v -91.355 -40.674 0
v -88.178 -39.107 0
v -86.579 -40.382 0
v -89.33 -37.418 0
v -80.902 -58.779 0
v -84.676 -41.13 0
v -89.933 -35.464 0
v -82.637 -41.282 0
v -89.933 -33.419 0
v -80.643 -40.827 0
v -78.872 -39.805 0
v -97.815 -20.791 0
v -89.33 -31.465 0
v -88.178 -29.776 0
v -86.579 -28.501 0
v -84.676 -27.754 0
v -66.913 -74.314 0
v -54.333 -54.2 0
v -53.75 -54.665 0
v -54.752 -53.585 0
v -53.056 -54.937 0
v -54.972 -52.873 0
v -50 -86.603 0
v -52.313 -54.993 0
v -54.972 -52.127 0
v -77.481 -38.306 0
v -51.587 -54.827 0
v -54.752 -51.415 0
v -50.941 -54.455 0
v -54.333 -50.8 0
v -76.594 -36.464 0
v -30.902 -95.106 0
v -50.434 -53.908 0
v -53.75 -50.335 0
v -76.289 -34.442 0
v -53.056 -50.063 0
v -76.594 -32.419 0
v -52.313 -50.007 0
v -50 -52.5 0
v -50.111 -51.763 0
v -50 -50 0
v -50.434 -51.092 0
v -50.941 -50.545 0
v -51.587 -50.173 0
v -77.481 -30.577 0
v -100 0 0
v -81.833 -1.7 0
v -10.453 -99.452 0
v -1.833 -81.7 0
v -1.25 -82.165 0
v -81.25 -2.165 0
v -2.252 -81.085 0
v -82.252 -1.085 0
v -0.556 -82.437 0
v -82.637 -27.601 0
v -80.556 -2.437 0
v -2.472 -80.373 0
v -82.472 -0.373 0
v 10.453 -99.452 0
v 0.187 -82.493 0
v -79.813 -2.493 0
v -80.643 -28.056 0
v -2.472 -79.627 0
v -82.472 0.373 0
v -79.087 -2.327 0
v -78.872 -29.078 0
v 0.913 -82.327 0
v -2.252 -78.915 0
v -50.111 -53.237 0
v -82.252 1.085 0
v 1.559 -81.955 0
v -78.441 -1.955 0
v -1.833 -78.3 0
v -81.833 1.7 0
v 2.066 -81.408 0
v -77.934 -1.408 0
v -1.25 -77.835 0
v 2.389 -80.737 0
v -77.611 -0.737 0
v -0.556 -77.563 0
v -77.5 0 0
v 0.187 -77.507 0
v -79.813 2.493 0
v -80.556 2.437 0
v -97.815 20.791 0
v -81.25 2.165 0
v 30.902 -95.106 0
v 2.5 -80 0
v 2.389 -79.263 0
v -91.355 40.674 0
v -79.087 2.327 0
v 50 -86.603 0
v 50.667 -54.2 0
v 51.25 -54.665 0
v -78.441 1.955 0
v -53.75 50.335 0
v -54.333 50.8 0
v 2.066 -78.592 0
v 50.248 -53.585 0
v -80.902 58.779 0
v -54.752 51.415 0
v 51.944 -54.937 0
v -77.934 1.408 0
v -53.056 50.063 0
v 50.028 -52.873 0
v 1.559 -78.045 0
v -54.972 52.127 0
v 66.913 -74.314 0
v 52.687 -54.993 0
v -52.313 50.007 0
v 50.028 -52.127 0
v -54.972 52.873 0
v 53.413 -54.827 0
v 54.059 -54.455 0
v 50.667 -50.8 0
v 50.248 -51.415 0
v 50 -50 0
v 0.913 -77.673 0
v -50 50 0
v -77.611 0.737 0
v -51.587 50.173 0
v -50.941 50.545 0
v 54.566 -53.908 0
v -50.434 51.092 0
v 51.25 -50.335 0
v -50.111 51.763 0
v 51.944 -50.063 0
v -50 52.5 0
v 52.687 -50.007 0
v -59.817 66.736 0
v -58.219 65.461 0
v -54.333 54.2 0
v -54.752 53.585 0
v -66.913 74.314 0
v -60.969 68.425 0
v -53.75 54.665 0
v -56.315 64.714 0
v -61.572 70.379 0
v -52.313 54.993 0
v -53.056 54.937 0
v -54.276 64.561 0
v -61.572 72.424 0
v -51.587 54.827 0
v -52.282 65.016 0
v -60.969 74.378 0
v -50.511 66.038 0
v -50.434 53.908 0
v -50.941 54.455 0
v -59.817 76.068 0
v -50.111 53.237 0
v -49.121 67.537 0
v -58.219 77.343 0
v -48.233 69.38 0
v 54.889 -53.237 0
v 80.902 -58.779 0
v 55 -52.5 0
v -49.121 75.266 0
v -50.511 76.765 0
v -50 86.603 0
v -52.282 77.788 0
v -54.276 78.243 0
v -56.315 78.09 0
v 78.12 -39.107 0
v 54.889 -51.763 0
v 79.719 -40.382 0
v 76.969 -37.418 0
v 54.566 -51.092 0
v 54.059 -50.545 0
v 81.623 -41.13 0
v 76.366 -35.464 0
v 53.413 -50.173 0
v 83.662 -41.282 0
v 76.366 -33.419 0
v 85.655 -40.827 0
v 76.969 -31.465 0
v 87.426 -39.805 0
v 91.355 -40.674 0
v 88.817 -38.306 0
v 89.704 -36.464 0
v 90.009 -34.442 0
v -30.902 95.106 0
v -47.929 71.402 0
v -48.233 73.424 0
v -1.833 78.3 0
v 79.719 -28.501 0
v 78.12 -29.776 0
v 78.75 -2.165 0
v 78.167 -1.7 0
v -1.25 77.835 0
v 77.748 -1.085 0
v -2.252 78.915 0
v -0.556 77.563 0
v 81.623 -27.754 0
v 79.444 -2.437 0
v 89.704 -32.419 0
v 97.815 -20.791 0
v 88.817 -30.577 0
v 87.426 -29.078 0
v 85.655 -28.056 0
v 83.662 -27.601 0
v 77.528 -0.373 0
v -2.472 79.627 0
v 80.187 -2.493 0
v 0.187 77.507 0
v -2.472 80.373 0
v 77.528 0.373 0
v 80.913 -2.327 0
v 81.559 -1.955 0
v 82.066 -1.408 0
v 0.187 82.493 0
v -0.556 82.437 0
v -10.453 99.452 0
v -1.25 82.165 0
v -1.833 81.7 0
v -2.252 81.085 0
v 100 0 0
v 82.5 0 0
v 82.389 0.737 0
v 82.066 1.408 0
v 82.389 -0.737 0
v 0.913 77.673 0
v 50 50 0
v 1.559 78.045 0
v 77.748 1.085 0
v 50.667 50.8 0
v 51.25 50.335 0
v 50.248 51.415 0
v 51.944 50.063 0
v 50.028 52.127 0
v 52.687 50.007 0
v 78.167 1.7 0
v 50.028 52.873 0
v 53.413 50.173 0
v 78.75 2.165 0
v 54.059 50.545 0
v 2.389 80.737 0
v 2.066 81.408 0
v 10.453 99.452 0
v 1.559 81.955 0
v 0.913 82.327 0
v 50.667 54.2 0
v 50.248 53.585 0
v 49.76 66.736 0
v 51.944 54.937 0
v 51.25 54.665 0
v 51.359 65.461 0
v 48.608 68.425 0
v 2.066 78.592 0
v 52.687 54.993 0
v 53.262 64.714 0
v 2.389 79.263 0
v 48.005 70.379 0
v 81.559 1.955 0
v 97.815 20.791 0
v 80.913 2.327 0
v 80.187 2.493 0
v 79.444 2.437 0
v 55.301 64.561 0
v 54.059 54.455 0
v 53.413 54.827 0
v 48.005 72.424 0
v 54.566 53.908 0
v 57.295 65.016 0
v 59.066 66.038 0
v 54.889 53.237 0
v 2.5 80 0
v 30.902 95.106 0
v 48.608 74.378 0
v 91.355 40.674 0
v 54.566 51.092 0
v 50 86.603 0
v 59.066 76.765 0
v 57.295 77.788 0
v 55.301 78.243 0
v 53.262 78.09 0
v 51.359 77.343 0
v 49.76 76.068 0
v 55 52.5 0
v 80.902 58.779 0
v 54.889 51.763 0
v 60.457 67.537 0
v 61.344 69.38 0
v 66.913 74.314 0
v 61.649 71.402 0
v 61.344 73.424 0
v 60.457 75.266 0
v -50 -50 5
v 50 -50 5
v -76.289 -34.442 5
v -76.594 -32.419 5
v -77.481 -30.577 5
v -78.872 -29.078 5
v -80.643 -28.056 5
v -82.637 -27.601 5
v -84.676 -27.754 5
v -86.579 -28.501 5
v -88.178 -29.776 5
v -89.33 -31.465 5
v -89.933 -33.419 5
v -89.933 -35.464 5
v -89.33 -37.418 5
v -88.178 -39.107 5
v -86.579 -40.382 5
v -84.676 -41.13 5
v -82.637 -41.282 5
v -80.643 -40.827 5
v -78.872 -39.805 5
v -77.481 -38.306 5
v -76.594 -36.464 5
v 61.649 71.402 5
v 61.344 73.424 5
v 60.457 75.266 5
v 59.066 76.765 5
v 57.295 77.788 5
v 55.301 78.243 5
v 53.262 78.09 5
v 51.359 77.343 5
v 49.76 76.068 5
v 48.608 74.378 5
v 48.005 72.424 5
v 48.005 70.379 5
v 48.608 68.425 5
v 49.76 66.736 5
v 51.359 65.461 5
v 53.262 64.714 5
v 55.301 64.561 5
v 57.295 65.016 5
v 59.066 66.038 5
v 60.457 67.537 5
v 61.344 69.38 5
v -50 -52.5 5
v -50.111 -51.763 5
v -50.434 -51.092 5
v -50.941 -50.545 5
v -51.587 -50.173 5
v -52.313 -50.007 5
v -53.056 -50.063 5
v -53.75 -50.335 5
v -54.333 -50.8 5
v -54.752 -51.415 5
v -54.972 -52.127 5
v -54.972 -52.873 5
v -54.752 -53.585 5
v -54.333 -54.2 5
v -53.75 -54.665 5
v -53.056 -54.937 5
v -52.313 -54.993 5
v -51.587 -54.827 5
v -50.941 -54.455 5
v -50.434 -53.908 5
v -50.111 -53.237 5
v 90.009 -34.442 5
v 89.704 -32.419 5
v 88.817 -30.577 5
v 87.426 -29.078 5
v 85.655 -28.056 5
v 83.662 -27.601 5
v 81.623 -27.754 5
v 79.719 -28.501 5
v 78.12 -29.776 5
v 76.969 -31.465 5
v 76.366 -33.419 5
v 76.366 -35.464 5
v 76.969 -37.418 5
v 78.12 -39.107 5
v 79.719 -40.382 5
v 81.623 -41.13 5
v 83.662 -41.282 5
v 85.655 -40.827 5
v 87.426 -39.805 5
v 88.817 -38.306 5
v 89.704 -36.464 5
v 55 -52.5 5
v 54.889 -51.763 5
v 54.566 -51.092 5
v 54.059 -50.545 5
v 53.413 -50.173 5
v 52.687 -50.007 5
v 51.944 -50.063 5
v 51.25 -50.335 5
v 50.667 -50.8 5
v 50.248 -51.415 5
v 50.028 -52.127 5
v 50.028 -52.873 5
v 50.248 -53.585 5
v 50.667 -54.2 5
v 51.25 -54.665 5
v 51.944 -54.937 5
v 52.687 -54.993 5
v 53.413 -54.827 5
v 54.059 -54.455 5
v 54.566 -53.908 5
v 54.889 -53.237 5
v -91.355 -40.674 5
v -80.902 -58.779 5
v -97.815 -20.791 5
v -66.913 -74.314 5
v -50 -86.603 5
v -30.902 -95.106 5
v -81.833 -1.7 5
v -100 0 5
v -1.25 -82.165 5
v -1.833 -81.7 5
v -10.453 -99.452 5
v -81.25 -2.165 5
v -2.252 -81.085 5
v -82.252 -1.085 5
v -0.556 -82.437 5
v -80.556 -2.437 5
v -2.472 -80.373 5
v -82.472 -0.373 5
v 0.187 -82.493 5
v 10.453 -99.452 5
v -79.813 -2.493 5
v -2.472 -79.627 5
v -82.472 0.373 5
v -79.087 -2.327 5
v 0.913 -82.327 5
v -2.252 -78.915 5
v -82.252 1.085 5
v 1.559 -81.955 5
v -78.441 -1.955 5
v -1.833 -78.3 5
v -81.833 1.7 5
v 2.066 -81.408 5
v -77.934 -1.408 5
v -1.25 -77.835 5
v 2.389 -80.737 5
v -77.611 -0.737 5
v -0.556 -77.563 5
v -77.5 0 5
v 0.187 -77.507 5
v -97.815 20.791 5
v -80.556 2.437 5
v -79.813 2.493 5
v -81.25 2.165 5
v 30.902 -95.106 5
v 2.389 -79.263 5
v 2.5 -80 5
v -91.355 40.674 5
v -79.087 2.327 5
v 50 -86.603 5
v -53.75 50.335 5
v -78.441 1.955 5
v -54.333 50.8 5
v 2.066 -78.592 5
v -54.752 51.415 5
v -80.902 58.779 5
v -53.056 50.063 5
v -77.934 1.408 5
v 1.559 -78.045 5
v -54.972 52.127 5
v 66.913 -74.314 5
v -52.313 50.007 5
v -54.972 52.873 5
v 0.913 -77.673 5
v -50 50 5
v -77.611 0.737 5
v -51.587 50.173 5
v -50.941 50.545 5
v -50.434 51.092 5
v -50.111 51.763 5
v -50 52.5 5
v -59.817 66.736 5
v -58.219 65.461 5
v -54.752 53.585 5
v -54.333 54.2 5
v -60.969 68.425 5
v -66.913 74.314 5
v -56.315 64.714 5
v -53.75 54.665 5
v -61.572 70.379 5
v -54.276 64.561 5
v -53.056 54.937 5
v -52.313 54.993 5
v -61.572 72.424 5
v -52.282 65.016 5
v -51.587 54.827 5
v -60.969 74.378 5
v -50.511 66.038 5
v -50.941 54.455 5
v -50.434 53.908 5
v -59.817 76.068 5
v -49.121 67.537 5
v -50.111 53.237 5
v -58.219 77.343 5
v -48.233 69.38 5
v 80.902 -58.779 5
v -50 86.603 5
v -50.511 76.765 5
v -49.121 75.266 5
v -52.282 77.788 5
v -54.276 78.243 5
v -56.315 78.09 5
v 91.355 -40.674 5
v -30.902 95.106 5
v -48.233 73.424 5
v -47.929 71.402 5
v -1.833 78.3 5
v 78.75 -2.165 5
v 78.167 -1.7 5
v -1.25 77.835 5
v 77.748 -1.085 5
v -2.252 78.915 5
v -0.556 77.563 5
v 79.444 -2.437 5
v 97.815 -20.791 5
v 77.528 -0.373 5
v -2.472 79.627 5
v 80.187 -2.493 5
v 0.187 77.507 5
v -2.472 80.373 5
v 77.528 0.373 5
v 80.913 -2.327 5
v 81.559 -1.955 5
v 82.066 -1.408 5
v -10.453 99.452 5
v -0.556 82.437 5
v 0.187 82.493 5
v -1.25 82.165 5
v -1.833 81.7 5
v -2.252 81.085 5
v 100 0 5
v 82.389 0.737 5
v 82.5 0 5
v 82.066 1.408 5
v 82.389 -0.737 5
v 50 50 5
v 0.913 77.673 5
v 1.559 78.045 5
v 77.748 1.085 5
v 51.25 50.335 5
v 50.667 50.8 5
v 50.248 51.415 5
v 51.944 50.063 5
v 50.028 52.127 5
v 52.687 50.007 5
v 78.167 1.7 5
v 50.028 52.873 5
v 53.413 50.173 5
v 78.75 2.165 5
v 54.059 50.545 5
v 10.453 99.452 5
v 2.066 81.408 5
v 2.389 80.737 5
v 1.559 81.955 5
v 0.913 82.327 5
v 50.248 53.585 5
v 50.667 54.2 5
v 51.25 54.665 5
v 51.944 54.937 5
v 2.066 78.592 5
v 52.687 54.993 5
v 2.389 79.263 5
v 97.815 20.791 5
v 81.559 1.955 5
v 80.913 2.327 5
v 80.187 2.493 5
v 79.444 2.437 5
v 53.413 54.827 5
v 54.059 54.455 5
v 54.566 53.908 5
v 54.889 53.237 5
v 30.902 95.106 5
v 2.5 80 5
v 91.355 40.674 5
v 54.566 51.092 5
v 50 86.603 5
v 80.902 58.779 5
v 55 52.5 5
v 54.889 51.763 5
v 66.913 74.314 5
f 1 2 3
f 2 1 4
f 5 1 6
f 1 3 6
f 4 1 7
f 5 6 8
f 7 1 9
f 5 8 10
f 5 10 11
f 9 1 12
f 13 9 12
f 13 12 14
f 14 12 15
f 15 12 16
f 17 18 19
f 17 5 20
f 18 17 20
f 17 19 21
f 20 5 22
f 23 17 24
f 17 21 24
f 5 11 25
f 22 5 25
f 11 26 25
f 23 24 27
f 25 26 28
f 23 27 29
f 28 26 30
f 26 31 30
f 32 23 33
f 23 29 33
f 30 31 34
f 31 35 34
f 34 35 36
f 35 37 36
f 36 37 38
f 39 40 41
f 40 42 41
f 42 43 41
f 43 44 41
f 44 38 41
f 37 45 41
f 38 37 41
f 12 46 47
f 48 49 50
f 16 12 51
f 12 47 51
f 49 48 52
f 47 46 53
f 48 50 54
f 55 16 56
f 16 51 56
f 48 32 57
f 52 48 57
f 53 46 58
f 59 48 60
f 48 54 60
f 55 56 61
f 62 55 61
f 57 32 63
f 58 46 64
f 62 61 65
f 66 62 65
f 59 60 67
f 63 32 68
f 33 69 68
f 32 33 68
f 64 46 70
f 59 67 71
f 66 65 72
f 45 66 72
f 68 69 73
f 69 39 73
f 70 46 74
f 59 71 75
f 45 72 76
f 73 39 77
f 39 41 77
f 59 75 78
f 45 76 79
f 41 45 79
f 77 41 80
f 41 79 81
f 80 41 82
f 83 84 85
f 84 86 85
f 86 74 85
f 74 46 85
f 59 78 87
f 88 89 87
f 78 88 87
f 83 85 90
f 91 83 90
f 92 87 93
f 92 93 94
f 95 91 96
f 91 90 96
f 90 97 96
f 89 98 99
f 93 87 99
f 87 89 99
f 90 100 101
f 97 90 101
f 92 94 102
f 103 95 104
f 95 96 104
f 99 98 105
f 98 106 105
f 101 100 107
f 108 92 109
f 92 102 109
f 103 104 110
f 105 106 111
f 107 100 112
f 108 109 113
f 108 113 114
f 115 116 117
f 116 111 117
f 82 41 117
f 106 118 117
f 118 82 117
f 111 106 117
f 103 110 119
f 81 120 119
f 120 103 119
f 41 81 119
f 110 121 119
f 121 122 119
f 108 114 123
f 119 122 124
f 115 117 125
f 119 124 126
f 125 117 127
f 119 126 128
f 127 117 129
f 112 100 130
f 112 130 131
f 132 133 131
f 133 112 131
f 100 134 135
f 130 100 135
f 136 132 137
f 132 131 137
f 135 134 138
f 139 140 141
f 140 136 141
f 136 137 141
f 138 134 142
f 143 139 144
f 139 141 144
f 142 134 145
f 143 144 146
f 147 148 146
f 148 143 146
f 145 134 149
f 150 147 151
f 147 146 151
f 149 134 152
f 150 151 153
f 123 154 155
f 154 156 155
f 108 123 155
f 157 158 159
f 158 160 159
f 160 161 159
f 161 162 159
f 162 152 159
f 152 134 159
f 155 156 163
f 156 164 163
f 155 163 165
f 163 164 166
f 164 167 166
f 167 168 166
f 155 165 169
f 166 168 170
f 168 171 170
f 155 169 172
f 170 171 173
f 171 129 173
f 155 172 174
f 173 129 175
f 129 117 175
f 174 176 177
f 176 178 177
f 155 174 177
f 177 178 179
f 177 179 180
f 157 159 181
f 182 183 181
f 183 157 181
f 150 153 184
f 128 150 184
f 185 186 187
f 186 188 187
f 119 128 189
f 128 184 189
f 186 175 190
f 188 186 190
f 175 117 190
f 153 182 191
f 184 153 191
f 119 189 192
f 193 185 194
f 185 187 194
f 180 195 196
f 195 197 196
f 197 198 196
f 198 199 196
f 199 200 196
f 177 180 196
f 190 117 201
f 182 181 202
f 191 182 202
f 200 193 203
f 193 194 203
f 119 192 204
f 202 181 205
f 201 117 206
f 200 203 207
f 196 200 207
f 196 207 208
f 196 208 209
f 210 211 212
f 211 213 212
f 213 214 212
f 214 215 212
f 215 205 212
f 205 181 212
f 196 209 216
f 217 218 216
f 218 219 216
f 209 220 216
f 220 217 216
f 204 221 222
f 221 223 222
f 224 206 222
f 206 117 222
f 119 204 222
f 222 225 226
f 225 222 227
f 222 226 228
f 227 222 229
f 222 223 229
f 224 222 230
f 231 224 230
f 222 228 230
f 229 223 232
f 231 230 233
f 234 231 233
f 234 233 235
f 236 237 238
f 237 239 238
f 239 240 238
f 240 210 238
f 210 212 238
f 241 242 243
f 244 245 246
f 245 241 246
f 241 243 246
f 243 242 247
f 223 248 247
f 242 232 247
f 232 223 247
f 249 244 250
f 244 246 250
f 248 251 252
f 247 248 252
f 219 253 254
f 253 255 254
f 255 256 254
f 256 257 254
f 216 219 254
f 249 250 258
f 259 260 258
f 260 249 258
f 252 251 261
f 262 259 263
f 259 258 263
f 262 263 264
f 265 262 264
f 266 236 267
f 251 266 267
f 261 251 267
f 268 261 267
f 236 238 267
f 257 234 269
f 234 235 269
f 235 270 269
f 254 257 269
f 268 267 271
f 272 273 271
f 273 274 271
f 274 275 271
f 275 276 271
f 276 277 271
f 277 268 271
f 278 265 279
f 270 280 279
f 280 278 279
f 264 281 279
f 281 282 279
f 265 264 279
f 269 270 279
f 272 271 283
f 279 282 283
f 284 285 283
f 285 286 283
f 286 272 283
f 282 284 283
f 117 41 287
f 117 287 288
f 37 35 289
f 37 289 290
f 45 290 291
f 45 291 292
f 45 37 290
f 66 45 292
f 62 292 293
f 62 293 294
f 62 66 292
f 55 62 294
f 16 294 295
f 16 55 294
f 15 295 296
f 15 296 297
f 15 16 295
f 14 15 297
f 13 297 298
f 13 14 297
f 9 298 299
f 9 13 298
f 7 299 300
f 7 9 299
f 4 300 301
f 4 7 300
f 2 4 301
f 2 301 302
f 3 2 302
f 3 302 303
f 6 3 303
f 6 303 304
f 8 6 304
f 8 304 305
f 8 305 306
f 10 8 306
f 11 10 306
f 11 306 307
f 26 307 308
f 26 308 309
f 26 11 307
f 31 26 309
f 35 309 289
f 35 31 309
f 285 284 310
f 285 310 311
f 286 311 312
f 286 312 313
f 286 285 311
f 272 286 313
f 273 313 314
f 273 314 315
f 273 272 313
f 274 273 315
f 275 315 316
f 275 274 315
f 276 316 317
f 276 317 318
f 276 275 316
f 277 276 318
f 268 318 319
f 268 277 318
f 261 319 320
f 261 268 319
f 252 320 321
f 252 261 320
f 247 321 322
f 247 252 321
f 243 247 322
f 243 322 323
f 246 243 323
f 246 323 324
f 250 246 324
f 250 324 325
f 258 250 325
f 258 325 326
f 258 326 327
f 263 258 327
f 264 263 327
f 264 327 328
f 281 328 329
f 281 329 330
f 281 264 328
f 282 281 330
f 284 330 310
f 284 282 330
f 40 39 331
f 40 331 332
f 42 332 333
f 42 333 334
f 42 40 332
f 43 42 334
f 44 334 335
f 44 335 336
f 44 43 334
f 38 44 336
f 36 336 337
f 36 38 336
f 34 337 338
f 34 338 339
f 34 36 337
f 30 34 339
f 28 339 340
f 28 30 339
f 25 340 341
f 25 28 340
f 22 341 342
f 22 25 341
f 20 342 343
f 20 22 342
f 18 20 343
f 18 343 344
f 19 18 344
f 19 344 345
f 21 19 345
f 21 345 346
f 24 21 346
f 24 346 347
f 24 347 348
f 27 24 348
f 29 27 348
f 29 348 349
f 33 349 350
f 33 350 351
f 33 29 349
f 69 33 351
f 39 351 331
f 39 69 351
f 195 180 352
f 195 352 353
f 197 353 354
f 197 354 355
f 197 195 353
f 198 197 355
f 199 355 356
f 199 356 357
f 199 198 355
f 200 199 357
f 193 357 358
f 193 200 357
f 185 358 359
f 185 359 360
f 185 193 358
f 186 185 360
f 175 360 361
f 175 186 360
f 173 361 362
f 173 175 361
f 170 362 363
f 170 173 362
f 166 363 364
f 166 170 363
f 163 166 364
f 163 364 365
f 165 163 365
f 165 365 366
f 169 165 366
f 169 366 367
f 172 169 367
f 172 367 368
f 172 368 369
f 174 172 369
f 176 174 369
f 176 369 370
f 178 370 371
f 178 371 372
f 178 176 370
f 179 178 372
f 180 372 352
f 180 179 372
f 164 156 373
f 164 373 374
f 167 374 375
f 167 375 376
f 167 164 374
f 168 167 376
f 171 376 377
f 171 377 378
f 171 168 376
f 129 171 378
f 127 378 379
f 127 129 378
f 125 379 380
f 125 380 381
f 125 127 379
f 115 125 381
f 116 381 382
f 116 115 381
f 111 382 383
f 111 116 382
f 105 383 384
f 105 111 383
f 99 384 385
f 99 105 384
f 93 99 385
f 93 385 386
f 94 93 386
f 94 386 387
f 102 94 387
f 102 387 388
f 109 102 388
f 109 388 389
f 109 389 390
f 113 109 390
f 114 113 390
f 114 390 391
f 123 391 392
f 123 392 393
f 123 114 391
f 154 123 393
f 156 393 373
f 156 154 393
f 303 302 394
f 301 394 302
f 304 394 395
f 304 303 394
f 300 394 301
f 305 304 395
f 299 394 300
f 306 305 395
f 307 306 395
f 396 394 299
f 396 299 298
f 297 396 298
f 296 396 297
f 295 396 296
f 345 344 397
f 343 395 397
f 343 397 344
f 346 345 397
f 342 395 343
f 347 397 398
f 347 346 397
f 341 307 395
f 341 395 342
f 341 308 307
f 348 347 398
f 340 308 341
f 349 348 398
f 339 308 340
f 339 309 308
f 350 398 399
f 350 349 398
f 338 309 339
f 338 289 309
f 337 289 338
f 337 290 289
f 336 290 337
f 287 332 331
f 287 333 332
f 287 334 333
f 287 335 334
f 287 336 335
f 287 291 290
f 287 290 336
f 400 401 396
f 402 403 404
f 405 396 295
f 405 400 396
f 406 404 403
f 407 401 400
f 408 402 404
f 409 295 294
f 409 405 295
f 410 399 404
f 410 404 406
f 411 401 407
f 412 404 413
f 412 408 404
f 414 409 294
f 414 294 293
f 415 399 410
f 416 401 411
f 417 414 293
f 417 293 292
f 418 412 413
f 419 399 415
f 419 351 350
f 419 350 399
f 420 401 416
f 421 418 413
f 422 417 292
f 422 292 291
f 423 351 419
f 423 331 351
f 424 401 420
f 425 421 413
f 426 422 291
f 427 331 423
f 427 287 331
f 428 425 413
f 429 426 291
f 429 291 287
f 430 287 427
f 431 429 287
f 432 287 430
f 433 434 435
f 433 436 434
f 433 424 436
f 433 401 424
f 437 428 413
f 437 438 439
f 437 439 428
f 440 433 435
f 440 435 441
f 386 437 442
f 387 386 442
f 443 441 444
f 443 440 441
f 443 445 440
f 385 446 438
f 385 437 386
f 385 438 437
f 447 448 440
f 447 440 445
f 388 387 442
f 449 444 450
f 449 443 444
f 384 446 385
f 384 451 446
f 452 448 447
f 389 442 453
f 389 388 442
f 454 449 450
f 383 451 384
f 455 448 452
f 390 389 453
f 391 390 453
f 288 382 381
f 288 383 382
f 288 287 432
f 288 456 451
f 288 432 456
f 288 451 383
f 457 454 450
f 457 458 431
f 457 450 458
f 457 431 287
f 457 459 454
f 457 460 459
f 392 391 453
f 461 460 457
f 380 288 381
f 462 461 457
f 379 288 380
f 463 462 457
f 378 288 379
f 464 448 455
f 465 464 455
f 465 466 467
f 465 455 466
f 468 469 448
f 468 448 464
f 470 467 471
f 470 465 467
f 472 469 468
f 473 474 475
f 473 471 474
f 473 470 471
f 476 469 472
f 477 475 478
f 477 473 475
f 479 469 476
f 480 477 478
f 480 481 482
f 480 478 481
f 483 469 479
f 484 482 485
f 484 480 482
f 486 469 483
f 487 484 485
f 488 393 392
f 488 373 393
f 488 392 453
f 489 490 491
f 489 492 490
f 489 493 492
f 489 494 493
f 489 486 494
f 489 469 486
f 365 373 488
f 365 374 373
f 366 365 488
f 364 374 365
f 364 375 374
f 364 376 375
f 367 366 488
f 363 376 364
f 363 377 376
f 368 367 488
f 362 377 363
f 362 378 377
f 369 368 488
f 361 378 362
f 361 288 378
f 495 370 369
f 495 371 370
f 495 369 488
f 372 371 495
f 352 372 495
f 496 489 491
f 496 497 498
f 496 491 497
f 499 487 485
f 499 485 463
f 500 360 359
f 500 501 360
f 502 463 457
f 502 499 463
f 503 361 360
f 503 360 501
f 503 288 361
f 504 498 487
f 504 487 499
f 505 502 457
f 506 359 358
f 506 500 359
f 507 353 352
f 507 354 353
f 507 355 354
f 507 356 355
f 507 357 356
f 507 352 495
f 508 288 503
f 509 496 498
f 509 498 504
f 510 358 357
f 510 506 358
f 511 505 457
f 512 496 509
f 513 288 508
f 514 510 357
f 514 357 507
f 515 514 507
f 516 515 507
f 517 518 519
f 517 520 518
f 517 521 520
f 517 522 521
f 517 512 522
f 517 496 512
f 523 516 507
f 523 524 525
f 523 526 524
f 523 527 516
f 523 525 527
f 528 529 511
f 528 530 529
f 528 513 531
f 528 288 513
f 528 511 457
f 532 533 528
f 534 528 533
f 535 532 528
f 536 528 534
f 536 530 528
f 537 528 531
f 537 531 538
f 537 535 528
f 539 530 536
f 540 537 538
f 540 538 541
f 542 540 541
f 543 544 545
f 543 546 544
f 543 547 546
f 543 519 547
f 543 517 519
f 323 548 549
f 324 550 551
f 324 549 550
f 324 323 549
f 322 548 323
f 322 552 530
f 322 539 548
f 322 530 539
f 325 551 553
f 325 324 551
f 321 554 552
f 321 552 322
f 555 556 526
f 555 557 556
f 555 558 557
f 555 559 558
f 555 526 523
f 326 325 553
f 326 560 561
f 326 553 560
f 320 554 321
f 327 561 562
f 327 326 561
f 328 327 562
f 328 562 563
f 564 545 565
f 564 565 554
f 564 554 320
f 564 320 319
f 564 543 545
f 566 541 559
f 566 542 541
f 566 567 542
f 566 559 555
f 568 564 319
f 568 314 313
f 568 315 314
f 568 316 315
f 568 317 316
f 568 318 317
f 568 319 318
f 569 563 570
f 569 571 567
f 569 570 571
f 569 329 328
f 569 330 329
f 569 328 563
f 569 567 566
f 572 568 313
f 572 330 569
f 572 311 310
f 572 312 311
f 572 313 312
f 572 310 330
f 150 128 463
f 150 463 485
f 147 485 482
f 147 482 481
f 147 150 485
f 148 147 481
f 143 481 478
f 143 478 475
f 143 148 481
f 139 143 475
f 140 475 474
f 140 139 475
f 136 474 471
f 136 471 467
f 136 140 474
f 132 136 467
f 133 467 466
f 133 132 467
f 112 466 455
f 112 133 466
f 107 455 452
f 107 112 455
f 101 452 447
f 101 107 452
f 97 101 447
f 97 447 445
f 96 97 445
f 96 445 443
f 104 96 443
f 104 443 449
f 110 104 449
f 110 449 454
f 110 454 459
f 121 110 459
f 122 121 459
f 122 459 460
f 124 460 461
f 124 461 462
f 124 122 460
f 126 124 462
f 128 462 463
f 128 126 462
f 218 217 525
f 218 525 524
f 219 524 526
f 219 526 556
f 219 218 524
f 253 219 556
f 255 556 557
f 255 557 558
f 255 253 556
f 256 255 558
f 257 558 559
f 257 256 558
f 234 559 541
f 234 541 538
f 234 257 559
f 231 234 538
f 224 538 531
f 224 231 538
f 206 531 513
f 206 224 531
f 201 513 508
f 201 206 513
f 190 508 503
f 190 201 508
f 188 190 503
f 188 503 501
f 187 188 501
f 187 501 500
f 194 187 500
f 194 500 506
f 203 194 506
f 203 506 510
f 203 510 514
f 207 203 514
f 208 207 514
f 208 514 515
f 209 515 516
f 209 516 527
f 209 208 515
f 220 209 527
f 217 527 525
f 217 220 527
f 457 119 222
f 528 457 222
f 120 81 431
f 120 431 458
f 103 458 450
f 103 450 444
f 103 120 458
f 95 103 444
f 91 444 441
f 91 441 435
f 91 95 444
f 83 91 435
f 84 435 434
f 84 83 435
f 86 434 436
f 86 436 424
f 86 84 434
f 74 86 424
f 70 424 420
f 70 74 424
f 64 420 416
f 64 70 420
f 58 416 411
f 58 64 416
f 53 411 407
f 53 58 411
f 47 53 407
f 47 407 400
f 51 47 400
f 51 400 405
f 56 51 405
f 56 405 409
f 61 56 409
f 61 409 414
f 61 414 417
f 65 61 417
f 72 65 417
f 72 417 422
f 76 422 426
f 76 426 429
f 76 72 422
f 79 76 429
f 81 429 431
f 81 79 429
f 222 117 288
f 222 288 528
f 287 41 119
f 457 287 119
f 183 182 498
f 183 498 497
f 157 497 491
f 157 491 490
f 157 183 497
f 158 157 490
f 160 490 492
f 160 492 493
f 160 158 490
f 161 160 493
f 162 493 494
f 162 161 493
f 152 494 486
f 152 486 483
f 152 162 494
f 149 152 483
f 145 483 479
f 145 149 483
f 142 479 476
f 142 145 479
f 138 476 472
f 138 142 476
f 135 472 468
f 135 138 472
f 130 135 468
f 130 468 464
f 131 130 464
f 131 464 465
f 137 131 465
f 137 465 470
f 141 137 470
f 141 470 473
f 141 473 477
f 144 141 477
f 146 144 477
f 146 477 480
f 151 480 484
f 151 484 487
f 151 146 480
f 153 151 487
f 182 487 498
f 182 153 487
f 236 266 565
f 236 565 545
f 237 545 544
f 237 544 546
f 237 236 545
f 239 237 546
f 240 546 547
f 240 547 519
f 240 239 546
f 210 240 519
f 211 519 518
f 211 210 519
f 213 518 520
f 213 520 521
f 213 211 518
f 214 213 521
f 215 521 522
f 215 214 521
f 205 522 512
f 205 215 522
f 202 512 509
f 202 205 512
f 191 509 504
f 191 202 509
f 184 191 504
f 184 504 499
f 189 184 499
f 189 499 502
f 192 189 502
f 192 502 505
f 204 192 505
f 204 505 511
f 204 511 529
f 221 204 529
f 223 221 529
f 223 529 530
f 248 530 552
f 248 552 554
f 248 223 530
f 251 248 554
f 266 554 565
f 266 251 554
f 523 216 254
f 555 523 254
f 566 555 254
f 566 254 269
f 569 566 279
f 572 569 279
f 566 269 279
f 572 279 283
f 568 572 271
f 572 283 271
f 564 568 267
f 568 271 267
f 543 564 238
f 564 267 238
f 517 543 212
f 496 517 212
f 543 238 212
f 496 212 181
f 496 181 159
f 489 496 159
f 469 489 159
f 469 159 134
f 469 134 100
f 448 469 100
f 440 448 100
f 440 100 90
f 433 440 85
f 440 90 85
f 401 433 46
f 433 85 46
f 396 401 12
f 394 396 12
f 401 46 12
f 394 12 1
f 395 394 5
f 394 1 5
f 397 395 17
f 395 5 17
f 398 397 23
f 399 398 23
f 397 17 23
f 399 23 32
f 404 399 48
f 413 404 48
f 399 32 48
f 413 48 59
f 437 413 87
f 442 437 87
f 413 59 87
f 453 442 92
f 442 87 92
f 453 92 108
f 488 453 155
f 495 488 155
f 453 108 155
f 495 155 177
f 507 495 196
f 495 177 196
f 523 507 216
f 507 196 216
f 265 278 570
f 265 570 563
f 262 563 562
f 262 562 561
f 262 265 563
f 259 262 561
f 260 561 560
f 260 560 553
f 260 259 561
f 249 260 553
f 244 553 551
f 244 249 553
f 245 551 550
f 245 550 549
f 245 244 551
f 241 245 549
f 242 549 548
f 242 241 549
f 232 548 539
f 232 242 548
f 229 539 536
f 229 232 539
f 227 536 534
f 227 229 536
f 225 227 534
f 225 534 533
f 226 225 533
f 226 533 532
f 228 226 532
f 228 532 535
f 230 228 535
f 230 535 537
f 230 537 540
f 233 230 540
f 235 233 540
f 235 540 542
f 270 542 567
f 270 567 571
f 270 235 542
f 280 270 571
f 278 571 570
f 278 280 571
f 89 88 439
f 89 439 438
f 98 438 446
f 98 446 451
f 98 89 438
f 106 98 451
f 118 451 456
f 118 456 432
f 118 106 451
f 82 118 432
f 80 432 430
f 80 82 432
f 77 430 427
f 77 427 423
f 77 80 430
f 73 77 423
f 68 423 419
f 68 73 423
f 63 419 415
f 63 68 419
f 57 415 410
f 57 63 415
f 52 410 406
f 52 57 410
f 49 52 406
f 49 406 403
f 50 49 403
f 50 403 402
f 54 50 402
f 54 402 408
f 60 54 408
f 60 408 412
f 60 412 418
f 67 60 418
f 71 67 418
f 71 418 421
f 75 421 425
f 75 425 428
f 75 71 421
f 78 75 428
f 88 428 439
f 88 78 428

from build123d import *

# Parameters (mm, degrees)
F0_R     = 100
F0_R_2   = 2.5
F0_R_3   = 6.86
F0_W     = 100
F0_H     = 100
F1_DEPTH = 5


with BuildPart() as f1:
    # F0 (on Top) → F1 (new body)
    with BuildSketch(Plane.XY):
        Circle(F0_R)
        with Locations((-52.5, -52.5)):
            Circle(F0_R_2, mode=Mode.SUBTRACT)
        with Locations((-83.149158, -34.441509)):
            Circle(F0_R_3, mode=Mode.SUBTRACT)
        with Locations((0, -80)):
            Circle(F0_R_2, mode=Mode.SUBTRACT)
        with Locations((52.5, -52.5)):
            Circle(F0_R_2, mode=Mode.SUBTRACT)
        with Locations((83.149158, -34.441509)):
            Circle(F0_R_3, mode=Mode.SUBTRACT)
        with Locations((-80, 0)):
            Circle(F0_R_2, mode=Mode.SUBTRACT)
        with Locations((-52.5, 52.5)):
            Circle(F0_R_2, mode=Mode.SUBTRACT)
        with Locations((-54.788529, 71.401801)):
            Circle(F0_R_3, mode=Mode.SUBTRACT)
        Rectangle(F0_W, F0_H, mode=Mode.SUBTRACT)
        with Locations((80, 0)):
            Circle(F0_R_2, mode=Mode.SUBTRACT)
        with Locations((0, 80)):
            Circle(F0_R_2, mode=Mode.SUBTRACT)
        with Locations((52.5, 52.5)):
            Circle(F0_R_2, mode=Mode.SUBTRACT)
        with Locations((54.788529, 71.401801)):
            Circle(F0_R_3, mode=Mode.SUBTRACT)
    extrude(amount=F1_DEPTH)


solid = f1.part
